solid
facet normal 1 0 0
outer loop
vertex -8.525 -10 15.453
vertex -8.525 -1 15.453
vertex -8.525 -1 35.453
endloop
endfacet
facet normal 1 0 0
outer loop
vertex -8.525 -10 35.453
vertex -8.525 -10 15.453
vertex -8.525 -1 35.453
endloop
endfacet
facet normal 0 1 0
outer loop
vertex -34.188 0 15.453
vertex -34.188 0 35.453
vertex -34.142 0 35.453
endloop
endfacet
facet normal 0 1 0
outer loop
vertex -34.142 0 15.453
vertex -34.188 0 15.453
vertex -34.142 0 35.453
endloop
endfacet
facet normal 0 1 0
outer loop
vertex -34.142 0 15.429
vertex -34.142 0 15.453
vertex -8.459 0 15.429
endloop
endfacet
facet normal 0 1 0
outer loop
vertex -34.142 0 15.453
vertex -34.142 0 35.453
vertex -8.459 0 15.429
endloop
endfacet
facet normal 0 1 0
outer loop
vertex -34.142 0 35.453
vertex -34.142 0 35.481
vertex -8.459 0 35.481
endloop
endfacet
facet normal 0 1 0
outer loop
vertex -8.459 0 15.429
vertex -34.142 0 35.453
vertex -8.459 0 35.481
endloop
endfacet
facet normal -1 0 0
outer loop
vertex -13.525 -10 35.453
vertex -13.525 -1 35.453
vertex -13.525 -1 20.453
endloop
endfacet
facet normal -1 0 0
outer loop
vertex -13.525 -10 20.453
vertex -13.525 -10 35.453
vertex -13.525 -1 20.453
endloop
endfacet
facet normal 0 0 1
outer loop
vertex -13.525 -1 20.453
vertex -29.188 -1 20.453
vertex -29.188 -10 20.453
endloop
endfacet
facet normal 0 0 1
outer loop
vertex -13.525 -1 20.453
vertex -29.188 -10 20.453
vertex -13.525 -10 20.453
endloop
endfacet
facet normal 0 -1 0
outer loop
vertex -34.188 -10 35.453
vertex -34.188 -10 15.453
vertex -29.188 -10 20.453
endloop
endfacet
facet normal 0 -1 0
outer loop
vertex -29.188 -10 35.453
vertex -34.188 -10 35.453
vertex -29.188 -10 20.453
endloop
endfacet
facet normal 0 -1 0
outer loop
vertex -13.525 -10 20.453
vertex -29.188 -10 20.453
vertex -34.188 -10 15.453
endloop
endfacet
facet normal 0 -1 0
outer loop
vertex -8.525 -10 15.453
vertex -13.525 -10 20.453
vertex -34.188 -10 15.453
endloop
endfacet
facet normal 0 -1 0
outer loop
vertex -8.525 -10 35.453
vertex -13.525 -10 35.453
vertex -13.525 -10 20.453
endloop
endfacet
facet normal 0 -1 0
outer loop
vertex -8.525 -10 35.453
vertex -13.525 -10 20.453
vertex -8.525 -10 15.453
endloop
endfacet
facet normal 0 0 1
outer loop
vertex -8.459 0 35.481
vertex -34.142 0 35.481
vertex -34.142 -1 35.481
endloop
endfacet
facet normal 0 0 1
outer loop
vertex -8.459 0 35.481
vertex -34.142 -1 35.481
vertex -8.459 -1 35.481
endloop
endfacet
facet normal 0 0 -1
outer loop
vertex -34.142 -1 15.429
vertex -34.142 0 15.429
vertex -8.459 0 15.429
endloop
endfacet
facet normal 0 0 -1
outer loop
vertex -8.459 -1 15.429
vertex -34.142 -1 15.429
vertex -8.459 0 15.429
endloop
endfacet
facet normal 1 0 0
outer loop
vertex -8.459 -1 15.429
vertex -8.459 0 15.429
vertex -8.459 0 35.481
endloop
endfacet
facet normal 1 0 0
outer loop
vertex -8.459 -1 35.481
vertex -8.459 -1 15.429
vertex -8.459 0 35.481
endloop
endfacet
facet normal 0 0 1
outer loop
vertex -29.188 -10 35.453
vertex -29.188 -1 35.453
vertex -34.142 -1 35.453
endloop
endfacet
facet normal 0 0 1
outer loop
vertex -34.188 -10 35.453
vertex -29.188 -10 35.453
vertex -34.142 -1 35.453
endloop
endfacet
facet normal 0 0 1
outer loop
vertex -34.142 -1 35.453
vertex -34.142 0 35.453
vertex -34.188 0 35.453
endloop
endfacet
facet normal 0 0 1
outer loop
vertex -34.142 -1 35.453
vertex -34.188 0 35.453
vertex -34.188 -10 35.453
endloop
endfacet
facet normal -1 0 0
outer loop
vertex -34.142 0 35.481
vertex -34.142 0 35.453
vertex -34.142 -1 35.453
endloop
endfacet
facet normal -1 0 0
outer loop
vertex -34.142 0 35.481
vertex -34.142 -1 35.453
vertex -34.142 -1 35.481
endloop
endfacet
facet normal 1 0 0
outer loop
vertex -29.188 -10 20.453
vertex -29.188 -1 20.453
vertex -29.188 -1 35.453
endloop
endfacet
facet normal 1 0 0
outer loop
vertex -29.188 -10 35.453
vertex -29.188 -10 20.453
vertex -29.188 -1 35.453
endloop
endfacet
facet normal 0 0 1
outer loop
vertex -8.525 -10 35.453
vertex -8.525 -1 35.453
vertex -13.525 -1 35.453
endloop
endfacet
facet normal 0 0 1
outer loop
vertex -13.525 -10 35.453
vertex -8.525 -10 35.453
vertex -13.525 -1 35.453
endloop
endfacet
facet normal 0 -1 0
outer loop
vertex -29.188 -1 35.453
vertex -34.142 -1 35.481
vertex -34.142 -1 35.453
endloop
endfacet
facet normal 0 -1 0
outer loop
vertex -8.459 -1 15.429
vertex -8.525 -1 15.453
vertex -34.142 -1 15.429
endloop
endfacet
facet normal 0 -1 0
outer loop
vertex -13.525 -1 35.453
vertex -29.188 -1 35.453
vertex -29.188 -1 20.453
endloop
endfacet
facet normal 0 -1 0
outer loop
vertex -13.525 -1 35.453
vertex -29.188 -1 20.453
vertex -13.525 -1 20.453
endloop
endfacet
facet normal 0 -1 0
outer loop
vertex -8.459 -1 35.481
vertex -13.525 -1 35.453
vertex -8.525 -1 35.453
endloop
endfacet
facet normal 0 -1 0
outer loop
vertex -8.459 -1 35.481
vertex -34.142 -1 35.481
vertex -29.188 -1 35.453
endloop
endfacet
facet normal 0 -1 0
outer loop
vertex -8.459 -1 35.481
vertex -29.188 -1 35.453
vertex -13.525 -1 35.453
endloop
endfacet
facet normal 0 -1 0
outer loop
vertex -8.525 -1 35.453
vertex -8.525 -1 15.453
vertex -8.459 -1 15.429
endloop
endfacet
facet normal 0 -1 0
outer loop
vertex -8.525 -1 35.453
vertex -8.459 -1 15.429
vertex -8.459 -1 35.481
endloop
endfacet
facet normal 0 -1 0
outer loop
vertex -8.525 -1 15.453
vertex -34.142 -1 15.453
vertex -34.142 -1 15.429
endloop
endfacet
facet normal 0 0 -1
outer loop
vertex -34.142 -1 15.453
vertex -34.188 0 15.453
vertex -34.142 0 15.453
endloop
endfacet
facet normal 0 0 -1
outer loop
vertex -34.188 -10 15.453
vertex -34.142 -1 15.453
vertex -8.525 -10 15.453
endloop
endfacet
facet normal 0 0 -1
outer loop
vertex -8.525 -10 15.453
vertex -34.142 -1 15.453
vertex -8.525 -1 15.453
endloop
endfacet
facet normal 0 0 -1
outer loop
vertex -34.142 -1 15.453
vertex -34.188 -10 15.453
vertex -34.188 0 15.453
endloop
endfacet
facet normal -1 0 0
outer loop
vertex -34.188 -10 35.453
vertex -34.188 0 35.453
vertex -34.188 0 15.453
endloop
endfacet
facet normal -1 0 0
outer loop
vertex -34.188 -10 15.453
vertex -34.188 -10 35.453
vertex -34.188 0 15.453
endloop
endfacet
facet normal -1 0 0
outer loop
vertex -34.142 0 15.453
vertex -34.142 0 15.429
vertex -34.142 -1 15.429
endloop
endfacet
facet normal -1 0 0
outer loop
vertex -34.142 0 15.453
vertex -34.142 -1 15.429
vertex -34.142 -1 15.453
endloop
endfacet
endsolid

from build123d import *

# Parameters (mm, degrees)
F0_W     = 15.6635074461
F0_H     = 5
F1_DEPTH = 10
F2_W     = 25.6835715845
F2_H     = 20.0516330078
F3_DEPTH = 1


with BuildPart() as f1:
    # F0 (on Front) → F1 (new body)
    with BuildSketch(Plane.XZ):
        Polygon((-29.1881171715, 35.4532431718), (-34.1881171715, 35.4532431718), (-34.1881171715, 15.4532431718), (-29.1881171715, 15.4532431718), (-29.1881171715, 20.4532431718), align=None)
        with Locations((-21.3563634484, 17.9532431718)):
            Rectangle(F0_W, F0_H)
        Polygon((-13.5246097253, 35.4532431718), (-13.5246097253, 20.4532431718), (-13.5246097253, 15.4532431718), (-8.5246097253, 15.4532431718), (-8.5246097253, 35.4532431718), align=None)
    extrude(amount=F1_DEPTH)

    # F2 (on Front) → F3 (join)
    with BuildSketch(Plane.XZ):
        with Locations((-21.3003805839, 25.4549360834)):
            Rectangle(F2_W, F2_H)
    extrude(amount=F3_DEPTH)


solid = f1.part
